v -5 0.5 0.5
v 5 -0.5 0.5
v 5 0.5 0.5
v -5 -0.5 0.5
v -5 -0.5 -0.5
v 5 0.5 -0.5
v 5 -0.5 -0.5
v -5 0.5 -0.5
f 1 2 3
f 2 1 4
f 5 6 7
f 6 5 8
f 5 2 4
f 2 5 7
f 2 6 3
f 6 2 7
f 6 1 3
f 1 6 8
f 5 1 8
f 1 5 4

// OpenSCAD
include <../openscad2calculix.scad>

os2cx_material_elastic_simple(
    "steel",
    youngs_modulus=[209, "GPa"],
    poissons_ratio=0.3,
    density=[7600, "kg/m^3"]);

os2cx_mesh("bar", mesher="naive_bricks", material="steel") {
    cube([10.0, 1.0, 1.0], center=true);
}

os2cx_select_surface("anchored_end", [-1, 0, 0], 45) {
    translate([-5.0, 0.0, 0.0])
        cube([0.1, 1.1, 1.1], center=true);
}

os2cx_select_volume("loaded_part") {
    cube([1.0, 1.1, 1.1], center=true);
}

os2cx_load_volume(
    "load",
    "loaded_part",
    force_total=[[0, 0, 100], "kN"]);

os2cx_analysis_steady_state_dynamics(
    fixed="anchored_end",
    load="load",
    length_unit="m",
    min_frequency=[1, "Hz"],
    max_frequency=[100, "Hz"],
    damping_ratio=0.01
);
